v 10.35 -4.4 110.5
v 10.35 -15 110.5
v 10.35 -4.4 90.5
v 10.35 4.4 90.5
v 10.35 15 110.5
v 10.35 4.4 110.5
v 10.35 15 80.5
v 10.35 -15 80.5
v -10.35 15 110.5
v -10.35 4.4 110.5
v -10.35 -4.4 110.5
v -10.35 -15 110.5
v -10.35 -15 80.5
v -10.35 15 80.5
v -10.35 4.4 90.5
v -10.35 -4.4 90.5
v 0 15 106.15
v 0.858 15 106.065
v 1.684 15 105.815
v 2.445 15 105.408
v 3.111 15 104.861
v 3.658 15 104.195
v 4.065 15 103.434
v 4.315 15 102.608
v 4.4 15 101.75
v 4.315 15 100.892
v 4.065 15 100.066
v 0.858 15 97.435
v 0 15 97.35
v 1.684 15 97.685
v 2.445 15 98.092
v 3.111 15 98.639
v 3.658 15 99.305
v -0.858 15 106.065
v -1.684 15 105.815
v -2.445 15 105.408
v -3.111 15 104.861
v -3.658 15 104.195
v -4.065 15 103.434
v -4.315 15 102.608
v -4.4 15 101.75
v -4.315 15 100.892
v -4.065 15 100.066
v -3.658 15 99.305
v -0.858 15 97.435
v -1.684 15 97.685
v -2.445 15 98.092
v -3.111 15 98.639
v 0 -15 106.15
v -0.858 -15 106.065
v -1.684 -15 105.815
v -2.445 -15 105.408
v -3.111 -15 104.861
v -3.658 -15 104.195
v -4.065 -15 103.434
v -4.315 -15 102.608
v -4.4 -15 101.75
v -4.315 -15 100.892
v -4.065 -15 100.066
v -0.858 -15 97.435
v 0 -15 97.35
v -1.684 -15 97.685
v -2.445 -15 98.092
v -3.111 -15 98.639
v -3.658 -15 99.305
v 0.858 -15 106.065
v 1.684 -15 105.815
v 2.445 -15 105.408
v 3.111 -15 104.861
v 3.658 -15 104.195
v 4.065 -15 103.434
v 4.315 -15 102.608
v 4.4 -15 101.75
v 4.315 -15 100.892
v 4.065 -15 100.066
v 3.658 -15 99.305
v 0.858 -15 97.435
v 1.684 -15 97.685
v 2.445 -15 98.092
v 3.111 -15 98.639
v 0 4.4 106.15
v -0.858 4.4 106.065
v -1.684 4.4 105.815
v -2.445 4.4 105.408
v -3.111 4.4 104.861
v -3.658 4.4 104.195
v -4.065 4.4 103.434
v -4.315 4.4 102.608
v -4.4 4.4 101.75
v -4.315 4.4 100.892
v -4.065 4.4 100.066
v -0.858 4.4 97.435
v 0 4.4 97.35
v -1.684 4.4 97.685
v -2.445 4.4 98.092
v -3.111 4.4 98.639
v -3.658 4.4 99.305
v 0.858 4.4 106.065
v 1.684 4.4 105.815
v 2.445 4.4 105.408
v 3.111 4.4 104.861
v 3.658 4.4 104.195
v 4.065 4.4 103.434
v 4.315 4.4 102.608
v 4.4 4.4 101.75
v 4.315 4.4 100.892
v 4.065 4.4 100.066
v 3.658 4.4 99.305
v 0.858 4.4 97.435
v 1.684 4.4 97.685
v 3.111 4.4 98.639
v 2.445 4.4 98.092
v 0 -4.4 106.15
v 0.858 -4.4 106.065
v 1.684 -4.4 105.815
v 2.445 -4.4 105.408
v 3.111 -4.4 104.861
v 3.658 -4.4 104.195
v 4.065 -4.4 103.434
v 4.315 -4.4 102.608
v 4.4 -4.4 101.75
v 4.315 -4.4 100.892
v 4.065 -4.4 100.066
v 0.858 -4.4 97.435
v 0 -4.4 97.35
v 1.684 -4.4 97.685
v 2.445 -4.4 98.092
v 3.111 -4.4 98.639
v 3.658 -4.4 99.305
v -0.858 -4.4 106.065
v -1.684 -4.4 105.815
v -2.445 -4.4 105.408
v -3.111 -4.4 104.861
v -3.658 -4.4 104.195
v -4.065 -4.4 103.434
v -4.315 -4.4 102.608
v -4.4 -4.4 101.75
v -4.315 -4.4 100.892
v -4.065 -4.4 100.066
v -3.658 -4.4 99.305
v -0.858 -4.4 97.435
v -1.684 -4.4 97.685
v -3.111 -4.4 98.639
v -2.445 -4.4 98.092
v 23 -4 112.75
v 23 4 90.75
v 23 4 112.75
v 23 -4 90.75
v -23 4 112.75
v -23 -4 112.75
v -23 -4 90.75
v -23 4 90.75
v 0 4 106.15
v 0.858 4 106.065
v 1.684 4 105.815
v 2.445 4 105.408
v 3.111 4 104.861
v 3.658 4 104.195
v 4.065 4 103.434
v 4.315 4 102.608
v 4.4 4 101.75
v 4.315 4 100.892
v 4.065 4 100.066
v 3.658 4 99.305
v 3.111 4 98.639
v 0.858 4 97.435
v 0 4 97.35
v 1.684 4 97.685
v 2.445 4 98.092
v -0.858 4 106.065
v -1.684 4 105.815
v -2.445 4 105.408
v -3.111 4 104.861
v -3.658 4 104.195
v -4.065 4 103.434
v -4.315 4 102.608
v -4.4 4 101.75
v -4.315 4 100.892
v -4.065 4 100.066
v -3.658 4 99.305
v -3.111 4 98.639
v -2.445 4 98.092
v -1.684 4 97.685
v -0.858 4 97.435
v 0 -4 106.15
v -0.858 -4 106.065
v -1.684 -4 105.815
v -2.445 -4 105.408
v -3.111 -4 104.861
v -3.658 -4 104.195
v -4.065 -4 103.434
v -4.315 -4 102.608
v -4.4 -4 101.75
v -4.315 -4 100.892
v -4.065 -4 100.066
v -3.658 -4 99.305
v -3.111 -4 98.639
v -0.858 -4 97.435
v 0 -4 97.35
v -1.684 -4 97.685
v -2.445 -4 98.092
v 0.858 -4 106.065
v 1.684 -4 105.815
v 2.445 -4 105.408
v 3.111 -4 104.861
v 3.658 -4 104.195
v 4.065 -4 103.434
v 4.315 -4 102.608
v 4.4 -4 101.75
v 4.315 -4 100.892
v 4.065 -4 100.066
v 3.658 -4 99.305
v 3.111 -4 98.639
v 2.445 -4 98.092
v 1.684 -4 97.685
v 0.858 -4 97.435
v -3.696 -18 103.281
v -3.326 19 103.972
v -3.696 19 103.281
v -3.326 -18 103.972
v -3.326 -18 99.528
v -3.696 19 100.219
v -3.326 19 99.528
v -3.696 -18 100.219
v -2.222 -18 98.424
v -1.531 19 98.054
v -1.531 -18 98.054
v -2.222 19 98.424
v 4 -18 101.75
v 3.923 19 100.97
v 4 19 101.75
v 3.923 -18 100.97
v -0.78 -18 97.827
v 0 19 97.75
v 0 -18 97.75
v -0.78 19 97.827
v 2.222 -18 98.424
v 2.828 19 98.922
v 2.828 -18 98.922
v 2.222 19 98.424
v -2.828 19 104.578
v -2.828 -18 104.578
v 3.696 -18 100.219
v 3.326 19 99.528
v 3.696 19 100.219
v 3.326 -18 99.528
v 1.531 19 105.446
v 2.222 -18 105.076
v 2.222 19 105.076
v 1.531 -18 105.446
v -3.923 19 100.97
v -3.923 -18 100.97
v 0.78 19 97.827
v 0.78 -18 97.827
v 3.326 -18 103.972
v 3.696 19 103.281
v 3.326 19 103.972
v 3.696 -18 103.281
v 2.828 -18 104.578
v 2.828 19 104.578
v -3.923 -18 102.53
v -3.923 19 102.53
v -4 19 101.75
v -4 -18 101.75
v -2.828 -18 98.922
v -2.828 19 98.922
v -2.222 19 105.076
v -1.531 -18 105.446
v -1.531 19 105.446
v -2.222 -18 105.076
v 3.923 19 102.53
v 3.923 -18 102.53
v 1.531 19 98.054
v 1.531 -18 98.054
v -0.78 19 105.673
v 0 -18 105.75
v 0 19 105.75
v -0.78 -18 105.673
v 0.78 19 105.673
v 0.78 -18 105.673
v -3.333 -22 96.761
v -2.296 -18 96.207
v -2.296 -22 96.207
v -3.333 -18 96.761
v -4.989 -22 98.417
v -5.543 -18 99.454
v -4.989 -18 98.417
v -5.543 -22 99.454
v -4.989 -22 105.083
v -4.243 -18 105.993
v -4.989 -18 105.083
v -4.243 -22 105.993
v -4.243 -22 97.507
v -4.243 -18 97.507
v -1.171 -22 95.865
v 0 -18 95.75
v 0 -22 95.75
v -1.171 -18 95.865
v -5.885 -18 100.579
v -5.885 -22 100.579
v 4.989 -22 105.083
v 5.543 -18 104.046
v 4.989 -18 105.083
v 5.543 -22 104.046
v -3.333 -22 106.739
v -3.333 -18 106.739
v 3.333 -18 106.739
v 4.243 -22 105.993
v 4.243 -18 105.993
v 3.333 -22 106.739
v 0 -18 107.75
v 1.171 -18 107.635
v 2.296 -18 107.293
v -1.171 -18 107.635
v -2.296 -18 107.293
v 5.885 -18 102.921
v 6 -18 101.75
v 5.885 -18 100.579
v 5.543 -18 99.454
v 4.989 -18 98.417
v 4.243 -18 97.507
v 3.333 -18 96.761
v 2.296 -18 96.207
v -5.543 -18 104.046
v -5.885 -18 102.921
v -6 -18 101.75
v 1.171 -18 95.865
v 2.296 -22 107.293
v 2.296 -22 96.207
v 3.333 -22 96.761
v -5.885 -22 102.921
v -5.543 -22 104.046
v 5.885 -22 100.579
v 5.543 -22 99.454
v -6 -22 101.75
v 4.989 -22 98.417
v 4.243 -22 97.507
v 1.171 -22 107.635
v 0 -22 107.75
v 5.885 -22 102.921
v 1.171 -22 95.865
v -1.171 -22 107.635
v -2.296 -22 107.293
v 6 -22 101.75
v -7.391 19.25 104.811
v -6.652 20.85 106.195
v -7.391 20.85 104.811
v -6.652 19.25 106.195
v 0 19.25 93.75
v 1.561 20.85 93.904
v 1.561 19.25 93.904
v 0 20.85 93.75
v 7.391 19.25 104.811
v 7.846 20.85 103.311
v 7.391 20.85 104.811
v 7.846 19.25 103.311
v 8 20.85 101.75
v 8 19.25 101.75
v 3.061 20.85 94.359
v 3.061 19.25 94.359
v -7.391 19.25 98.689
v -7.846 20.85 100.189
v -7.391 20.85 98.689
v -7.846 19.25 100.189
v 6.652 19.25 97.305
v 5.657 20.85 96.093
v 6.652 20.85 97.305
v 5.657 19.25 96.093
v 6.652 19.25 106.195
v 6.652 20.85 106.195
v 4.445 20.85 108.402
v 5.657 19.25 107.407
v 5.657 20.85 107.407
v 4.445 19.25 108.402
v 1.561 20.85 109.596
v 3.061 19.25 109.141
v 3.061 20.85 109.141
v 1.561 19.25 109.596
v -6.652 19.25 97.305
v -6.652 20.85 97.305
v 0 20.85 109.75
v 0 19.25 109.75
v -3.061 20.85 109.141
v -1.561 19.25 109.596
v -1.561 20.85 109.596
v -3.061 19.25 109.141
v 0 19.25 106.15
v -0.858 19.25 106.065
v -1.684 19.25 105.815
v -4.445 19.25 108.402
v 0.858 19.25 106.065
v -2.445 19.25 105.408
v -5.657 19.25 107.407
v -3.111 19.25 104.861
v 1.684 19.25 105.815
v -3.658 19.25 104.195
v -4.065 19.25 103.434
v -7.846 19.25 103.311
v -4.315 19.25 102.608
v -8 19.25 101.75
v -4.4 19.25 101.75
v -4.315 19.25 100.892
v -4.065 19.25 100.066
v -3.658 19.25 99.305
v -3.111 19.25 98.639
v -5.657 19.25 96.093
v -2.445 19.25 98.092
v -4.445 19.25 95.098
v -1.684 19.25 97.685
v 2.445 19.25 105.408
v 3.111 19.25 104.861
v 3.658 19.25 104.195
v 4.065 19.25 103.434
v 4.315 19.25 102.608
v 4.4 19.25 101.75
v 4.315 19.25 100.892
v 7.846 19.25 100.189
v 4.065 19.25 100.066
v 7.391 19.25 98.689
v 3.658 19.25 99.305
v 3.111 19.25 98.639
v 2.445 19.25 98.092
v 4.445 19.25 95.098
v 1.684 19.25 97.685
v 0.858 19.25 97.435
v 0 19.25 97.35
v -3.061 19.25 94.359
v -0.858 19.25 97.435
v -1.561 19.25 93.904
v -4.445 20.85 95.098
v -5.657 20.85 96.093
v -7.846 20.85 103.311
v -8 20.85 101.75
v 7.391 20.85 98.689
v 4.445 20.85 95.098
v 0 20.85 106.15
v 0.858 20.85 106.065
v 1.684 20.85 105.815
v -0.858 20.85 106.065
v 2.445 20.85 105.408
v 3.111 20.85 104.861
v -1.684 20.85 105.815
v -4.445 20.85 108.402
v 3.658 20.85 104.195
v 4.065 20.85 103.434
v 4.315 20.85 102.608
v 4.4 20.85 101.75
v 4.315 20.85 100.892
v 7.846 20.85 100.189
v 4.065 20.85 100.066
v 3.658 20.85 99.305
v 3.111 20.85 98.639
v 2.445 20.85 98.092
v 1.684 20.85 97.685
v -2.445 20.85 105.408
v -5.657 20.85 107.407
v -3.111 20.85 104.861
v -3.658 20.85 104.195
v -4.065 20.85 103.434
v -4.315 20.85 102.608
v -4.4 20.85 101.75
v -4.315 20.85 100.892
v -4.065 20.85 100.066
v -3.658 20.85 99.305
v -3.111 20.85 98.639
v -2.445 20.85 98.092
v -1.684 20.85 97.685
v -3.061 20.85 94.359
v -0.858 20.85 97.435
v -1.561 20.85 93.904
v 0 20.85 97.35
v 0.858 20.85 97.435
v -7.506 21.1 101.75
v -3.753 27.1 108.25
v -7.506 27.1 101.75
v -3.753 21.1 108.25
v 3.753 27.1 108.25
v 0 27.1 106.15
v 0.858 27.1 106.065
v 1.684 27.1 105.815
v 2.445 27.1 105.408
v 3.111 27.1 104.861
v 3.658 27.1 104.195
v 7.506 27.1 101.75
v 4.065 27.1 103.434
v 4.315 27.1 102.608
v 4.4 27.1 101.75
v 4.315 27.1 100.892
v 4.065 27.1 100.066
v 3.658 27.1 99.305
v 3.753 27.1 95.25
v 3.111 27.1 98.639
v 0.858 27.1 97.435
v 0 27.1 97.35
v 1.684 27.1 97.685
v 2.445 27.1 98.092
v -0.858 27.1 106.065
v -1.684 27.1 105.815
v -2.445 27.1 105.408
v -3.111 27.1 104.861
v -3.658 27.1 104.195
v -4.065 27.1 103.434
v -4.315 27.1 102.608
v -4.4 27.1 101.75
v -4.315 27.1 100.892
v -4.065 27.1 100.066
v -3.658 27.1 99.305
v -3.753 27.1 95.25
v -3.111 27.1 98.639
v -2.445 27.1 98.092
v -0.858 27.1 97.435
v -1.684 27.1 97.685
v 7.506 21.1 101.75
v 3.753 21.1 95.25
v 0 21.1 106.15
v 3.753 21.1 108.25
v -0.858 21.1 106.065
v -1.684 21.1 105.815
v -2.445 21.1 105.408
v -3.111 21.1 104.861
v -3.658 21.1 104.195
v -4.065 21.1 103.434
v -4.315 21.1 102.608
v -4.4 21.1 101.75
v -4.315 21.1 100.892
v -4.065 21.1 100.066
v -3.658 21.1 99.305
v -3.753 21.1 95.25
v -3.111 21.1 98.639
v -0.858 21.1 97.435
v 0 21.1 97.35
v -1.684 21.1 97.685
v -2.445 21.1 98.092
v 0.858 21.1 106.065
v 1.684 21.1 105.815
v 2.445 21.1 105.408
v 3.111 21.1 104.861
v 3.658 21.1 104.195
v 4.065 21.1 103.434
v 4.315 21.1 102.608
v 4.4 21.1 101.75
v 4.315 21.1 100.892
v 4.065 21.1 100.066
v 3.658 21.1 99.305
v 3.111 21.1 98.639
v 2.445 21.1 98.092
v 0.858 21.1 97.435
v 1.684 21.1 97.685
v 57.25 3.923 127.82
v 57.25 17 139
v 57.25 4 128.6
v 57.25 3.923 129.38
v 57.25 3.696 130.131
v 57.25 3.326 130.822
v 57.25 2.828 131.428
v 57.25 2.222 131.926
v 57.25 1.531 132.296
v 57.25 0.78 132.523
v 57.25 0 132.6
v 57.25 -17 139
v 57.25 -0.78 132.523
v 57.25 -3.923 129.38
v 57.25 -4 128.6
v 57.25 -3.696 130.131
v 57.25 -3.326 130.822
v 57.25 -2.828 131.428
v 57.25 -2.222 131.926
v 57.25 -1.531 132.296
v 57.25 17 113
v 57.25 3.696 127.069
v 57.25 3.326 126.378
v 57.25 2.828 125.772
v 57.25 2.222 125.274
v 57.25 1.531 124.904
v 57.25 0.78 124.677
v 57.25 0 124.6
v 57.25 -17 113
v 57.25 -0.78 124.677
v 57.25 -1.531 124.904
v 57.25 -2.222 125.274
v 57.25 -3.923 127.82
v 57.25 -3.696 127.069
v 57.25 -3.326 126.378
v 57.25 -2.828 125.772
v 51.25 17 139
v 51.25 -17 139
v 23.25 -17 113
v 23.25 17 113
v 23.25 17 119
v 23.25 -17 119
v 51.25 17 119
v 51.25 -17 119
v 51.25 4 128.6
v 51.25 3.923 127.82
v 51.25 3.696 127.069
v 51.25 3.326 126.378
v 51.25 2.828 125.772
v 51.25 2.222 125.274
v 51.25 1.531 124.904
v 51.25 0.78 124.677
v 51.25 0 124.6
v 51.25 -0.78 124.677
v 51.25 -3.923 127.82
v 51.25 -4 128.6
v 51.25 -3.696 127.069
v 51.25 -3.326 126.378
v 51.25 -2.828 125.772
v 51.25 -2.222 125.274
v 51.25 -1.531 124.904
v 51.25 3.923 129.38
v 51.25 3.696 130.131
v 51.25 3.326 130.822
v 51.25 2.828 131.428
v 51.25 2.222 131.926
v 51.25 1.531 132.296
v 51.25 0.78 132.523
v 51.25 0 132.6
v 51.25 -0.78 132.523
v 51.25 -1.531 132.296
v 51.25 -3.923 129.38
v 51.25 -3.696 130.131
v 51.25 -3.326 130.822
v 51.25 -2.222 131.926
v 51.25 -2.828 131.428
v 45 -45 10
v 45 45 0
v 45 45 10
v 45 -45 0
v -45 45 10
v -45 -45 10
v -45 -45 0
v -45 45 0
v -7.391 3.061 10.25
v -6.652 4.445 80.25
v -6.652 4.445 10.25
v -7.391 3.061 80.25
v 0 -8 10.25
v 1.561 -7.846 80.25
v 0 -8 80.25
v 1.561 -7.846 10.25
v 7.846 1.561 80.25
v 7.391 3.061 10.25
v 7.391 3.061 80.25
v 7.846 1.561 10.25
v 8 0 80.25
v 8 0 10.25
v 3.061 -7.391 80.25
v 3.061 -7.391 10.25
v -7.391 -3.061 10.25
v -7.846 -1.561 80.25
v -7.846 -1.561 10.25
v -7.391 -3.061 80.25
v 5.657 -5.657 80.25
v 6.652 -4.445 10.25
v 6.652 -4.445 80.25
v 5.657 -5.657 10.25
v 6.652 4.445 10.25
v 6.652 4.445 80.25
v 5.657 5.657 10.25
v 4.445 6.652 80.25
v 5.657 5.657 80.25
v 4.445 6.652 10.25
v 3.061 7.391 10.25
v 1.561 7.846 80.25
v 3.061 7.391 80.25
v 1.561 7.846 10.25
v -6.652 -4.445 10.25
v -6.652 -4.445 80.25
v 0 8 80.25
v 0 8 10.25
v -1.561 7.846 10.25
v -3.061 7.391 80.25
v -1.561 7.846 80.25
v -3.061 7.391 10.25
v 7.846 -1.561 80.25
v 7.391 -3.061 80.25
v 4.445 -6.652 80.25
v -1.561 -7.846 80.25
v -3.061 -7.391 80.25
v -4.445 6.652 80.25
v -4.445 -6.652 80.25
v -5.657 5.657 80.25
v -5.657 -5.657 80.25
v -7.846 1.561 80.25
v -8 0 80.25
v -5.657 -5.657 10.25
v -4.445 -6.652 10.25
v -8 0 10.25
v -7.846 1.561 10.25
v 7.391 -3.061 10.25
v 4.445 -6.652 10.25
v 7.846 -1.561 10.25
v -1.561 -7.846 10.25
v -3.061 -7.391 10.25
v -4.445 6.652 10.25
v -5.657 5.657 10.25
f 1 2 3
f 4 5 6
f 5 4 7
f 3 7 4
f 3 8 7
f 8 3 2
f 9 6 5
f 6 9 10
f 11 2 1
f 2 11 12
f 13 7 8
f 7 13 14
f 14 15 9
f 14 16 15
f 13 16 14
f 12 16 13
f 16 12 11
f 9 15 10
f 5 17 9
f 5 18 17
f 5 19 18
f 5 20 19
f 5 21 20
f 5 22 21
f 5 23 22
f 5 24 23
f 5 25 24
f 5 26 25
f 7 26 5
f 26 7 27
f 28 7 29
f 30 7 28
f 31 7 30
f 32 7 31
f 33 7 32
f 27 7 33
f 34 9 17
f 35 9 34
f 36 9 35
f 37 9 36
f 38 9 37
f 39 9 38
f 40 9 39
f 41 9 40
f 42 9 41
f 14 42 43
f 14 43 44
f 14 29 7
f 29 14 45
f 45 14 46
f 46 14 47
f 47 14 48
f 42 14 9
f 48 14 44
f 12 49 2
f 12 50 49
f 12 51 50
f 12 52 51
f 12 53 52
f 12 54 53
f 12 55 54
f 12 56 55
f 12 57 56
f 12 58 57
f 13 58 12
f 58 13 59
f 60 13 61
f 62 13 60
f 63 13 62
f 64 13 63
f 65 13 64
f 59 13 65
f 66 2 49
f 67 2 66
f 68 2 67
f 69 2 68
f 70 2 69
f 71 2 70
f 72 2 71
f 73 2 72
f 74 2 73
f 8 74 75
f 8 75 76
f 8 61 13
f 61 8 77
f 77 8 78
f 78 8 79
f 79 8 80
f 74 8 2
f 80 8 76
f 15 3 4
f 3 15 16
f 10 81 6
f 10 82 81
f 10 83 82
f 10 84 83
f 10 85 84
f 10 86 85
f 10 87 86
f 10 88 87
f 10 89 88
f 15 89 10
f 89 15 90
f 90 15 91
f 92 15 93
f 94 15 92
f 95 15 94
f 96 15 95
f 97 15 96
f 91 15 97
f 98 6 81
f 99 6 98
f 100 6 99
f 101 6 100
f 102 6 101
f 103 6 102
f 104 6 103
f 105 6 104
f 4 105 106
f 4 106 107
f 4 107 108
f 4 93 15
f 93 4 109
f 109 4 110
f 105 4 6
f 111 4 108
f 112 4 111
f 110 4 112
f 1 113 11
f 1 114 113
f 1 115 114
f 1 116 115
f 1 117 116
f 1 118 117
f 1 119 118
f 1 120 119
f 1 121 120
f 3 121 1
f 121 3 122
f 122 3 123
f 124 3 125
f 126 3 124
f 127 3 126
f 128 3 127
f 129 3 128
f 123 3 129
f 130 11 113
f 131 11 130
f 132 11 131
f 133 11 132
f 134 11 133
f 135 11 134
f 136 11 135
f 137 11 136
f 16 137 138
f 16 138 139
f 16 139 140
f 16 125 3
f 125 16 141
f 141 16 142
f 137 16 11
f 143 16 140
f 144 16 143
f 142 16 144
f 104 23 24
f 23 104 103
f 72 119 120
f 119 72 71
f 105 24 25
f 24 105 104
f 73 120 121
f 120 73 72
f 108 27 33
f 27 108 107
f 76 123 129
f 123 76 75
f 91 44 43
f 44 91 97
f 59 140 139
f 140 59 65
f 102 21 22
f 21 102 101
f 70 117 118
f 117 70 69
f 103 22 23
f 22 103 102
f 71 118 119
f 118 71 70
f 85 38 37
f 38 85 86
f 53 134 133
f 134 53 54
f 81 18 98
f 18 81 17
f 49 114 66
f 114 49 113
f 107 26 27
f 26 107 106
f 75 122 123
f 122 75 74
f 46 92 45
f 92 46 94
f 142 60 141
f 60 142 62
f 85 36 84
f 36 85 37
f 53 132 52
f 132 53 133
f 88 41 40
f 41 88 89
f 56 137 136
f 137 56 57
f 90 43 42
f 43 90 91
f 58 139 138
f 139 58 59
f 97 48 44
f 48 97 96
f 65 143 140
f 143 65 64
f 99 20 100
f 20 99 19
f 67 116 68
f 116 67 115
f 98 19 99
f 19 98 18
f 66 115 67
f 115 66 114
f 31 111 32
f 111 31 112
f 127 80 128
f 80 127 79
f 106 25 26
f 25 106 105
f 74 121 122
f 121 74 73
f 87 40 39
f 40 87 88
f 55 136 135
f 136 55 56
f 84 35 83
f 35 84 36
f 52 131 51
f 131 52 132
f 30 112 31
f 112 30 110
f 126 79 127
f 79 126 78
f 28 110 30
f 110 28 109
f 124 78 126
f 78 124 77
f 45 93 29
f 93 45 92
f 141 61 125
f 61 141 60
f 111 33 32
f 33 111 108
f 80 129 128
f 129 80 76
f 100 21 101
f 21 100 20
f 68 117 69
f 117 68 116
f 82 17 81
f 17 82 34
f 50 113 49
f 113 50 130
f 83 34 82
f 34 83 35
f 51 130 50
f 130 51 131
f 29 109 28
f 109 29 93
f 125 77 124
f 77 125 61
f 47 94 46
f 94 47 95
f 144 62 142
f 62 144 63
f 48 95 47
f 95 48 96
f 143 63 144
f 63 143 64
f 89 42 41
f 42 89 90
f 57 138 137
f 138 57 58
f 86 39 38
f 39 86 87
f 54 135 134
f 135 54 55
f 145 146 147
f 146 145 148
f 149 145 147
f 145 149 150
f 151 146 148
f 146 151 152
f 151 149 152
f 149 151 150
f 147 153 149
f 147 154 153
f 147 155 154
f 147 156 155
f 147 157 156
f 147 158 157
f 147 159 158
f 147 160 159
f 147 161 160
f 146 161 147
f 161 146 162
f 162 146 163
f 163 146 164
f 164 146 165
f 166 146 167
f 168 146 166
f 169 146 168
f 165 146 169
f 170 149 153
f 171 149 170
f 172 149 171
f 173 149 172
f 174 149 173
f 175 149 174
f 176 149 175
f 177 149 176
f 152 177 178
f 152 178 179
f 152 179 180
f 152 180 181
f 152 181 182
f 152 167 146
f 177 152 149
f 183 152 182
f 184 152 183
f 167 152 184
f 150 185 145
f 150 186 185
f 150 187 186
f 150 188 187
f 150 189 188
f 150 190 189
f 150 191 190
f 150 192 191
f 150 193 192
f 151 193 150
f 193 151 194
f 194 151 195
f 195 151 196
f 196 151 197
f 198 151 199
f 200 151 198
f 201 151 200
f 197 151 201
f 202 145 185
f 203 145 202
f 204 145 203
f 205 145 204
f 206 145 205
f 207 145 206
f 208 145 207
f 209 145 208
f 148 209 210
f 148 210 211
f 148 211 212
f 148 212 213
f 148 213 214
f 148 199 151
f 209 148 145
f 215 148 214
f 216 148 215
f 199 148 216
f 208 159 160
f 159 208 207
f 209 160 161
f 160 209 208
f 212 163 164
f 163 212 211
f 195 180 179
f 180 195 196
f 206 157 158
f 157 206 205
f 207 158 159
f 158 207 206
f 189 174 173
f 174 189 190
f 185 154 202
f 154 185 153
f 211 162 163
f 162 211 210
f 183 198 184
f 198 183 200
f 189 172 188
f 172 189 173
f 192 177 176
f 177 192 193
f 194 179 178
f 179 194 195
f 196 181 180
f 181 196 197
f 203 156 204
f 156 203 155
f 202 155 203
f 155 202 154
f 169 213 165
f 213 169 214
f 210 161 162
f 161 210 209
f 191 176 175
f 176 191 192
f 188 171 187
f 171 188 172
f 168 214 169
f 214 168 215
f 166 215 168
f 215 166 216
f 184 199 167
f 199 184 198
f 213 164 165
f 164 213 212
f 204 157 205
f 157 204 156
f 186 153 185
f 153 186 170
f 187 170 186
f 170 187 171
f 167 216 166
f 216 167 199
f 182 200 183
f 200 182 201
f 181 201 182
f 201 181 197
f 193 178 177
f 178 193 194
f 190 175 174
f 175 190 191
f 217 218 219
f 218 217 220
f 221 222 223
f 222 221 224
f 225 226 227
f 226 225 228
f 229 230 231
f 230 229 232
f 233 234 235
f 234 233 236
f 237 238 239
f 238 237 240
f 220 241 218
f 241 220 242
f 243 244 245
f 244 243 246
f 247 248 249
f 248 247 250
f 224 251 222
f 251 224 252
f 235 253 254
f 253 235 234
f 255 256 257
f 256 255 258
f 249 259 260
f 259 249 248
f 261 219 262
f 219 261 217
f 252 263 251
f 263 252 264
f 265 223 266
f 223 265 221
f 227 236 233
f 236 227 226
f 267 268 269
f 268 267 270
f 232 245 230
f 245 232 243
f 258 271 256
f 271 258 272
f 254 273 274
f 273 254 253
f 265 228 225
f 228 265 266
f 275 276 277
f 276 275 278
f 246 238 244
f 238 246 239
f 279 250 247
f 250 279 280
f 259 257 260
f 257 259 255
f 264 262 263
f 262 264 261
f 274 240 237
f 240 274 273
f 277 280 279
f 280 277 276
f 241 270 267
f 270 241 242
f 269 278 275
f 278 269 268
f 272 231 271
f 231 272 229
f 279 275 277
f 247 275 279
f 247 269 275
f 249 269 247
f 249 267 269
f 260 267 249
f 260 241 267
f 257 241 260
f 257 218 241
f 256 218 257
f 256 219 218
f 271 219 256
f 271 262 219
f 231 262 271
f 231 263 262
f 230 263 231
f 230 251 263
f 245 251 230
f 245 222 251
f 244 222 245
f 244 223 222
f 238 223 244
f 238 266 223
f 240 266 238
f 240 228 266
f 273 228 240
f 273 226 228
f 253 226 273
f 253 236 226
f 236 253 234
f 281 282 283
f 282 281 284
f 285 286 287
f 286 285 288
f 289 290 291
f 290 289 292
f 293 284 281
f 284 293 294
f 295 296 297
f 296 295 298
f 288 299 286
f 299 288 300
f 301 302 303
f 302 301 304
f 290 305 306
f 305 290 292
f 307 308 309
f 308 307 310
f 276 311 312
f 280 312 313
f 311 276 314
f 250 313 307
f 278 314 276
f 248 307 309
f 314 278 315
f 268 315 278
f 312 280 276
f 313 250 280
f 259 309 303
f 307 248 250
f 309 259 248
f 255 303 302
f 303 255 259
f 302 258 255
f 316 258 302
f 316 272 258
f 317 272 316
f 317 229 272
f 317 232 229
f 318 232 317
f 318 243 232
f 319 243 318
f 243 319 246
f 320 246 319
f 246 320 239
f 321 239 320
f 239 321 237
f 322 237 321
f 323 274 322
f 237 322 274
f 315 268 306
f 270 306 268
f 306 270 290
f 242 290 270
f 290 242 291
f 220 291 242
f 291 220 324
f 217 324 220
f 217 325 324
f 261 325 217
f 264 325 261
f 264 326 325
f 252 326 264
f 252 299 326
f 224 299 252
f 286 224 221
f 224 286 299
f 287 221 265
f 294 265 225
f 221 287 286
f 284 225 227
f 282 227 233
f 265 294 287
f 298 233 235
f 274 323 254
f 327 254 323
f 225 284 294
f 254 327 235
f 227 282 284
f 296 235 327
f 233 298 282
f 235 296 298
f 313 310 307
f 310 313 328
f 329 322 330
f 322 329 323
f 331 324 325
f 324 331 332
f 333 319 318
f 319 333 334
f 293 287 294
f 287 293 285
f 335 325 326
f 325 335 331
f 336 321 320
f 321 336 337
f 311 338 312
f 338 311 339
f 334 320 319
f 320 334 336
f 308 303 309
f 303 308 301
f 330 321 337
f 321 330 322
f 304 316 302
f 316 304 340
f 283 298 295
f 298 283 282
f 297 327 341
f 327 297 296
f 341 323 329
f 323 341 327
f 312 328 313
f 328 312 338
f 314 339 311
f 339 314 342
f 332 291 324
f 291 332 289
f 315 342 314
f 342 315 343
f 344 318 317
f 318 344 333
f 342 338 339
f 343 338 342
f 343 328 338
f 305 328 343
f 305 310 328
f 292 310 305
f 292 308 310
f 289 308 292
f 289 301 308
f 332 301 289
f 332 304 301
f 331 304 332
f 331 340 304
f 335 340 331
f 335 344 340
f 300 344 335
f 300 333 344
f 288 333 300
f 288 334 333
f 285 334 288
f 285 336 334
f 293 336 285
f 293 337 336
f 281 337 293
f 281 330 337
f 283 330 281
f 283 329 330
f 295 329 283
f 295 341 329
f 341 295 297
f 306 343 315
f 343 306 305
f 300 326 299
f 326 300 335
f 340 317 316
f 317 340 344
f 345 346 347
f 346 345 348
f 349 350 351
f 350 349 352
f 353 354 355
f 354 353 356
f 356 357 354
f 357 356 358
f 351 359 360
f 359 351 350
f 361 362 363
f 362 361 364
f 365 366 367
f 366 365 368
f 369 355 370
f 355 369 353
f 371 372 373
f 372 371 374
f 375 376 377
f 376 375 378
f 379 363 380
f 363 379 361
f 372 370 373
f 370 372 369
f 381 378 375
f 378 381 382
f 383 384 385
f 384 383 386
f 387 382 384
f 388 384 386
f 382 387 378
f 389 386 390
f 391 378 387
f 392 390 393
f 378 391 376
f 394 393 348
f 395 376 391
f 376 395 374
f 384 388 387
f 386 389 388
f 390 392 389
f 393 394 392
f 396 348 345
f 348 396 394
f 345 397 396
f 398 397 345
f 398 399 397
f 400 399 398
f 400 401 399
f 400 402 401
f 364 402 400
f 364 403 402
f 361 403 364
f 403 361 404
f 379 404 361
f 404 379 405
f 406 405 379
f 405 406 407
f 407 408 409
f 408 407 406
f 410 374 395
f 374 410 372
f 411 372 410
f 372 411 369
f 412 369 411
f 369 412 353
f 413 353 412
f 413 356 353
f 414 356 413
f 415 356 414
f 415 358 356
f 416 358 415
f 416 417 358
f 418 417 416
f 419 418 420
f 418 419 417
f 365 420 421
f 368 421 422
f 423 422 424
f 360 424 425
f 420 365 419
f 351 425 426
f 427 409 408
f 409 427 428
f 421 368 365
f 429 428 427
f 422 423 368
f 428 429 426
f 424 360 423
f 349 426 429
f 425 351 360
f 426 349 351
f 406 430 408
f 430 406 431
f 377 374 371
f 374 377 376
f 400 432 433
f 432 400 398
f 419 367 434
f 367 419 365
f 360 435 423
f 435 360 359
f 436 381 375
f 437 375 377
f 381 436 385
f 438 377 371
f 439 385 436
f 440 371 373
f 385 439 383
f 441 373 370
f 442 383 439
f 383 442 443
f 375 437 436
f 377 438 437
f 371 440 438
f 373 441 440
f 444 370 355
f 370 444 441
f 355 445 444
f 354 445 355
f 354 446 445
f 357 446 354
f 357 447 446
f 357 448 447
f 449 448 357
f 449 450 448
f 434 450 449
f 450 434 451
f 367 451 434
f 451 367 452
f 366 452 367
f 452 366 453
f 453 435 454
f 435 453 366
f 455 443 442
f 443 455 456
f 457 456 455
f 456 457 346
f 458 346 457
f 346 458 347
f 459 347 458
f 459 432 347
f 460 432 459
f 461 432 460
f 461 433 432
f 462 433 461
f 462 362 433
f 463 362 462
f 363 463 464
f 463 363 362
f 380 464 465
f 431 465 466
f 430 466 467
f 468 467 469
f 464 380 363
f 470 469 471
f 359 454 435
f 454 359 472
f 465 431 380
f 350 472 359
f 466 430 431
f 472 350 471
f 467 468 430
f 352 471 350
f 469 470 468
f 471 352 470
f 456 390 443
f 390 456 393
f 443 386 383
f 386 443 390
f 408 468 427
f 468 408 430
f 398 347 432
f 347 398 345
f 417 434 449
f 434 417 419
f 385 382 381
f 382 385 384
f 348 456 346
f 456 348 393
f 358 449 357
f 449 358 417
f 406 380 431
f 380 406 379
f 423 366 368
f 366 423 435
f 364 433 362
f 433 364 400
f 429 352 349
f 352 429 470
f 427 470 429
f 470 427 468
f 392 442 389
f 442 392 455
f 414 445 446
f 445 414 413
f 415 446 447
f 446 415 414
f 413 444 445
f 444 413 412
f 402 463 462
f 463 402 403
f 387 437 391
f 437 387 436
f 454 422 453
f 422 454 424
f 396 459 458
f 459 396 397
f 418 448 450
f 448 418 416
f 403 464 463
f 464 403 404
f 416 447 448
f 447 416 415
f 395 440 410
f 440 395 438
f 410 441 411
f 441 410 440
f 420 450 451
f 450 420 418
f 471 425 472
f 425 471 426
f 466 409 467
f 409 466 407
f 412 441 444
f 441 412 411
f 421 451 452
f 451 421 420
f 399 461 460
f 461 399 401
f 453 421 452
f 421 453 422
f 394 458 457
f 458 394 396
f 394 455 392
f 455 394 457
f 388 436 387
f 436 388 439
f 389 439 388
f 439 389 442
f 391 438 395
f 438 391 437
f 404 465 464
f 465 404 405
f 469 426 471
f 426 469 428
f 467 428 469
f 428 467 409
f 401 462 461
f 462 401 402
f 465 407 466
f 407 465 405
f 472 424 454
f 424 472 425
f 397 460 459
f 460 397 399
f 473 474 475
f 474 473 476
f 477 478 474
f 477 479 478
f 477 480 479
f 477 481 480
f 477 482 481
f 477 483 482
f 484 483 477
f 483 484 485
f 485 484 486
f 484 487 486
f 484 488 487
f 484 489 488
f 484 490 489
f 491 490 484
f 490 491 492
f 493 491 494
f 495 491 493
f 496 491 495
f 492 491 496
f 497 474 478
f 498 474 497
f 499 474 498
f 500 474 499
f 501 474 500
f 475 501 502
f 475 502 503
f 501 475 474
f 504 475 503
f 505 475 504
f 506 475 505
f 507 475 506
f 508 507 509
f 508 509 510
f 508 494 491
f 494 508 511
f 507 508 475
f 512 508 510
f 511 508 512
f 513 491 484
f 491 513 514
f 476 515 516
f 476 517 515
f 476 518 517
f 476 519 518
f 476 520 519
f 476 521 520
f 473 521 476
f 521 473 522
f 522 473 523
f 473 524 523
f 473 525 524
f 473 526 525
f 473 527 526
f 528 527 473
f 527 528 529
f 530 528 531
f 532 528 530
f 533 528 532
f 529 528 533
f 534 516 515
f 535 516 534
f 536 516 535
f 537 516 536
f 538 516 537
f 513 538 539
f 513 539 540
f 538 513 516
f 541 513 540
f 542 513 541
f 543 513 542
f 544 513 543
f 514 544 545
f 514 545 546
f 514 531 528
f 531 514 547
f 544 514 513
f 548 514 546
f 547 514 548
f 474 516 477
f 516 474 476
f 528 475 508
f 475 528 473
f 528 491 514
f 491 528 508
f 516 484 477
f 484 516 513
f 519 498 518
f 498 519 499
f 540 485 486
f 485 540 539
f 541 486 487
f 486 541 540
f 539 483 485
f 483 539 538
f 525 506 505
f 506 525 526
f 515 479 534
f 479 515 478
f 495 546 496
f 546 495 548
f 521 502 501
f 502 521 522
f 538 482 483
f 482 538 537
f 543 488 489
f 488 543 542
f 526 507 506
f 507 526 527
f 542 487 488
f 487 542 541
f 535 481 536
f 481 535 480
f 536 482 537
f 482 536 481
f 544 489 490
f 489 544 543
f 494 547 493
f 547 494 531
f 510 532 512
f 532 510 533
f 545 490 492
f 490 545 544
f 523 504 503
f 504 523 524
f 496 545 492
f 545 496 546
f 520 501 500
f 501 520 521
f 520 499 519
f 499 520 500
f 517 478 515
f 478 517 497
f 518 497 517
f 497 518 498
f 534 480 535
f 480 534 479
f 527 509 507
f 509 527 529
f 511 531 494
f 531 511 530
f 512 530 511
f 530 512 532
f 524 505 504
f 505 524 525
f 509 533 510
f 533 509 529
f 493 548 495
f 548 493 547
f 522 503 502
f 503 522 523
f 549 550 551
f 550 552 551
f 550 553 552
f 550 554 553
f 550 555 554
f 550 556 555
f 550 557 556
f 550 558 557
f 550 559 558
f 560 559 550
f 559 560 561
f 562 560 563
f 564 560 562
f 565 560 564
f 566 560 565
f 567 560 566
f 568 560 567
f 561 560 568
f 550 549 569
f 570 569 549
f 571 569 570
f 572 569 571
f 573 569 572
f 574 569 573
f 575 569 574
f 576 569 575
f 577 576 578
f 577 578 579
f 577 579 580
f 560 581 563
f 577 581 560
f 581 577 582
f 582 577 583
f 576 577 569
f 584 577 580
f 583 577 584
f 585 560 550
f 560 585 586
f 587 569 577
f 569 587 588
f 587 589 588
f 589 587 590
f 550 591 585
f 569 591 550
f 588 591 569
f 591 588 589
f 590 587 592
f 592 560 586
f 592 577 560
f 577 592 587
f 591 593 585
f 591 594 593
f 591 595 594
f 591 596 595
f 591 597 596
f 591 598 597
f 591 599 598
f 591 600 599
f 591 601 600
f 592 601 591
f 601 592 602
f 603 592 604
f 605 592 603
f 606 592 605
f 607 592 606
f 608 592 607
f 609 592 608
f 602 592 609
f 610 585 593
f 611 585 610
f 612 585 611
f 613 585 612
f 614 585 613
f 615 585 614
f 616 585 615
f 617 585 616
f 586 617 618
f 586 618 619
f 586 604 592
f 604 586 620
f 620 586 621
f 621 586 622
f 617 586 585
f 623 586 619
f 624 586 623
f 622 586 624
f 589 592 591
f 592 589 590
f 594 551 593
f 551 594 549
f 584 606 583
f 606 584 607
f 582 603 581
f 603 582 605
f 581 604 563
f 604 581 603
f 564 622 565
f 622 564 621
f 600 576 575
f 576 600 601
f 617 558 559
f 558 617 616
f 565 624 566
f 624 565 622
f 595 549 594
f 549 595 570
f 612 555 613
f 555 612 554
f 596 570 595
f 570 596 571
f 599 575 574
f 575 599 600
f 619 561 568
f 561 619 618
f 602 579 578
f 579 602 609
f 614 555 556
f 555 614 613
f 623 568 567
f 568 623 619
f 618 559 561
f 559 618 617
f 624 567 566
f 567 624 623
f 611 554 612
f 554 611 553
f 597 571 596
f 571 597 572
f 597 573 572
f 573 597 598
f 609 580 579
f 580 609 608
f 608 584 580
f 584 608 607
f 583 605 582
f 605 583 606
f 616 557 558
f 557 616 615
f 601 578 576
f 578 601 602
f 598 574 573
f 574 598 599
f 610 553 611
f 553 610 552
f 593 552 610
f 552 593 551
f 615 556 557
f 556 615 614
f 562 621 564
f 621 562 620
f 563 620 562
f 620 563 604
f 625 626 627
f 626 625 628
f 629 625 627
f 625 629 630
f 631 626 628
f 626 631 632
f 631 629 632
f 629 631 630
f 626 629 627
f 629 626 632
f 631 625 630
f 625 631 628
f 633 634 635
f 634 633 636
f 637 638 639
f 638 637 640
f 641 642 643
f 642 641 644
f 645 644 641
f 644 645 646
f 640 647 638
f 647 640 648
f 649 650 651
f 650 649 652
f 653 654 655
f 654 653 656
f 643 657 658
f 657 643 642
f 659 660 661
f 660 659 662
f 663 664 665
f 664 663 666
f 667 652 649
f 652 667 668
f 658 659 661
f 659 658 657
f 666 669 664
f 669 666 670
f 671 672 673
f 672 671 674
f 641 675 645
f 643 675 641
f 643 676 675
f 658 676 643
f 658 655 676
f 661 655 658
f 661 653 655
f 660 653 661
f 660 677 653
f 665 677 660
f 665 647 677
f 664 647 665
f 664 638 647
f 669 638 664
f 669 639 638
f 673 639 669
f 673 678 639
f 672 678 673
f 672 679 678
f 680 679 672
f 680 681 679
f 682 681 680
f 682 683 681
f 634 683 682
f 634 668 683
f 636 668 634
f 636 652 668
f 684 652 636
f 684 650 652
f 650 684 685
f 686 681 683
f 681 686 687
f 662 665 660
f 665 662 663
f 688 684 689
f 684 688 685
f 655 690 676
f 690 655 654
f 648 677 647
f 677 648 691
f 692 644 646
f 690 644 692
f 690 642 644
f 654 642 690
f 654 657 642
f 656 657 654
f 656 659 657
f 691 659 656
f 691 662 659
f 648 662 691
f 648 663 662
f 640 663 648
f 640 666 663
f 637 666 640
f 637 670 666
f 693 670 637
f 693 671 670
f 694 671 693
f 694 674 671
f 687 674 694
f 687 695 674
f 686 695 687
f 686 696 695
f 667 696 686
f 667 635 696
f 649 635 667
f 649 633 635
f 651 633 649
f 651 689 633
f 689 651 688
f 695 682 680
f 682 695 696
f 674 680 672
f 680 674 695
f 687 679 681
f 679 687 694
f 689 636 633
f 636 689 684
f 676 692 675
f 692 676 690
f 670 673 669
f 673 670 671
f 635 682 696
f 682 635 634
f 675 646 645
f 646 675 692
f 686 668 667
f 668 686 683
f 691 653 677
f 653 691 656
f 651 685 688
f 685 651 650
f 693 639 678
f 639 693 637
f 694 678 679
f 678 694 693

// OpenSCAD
$fn = 32;

// ------------------------------------------------------------------------
// Lamp arm: column d16 x 70 mm, arm 46 mm
// Every part is its own module, assembly() places every instance.
// ------------------------------------------------------------------------

// --- part 1 ---
module lamp_base() {
  difference() {
    translate([-45, -45, 0]) cube([90, 90, 10]);
  }
}

// --- part 2 ---
module lamp_column() {
  cylinder(h = 70, d = 16);
}

// --- part 3 ---
module head_fork() {
  difference() {
    translate([-10.35, -15, 0]) cube([20.7, 30, 30]);
    translate([-11.35, -4.4, 10]) cube([22.7, 8.8, 21]);
    translate([0, 0, 21.25]) rotate([90, 0, 0]) cylinder(h = 32, d = 8.8, center = true);
  }
}

// --- part 4 ---
module lamp_arm() {
  difference() {
    translate([-23, -4, 0]) cube([46, 8, 22]);
    translate([0, 0, 11]) rotate([90, 0, 0]) cylinder(h = 10, d = 8.8, center = true);
  }
}

// --- part 5 ---
module arm_pin() {
  rotate([0, 90, 0]) cylinder(h = 38, d = 8, center = true);
  translate([-22, 0, 0]) rotate([0, 90, 0]) cylinder(h = 4, d = 12);
}

// --- part 6 ---
module arm_washer() {
  difference() {
      translate([0, 0, 0]) cylinder(h = 1.6, d = 16);
      translate([0, 0, -1]) cylinder(h = 3.6, d = 8.8);
    }
}

// --- part 7 ---
module arm_nut() {
  difference() {
    linear_extrude(height = 6) polygon(points = [[7.506, 0], [3.753, 6.5], [-3.753, 6.5], [-7.506, 0], [-3.753, -6.5], [3.753, -6.5]]);
    translate([0, 0, -1]) cylinder(h = 8, d = 8.8);
  }
}

// --- part 8 ---
module shade_bracket() {
  difference() {
    translate([-17, -17, 0]) cube([34, 34, 26]);
    translate([-18, -18, 6]) cube([29, 36, 21]);
    translate([14, 0, 15.6]) rotate([0, 90, 0]) cylinder(h = 8, d = 8, center = true);
  }
}

// --- assembly ---
module assembly() {
  color([0.80, 0.24, 0.20]) translate([0, 0, 0]) rotate([0, 0, 0]) lamp_base();
  color([0.20, 0.45, 0.75]) translate([0, 0, 10.25]) rotate([0, 0, 0]) lamp_column();
  color([0.25, 0.62, 0.32]) translate([0, 0, 80.5]) rotate([0, 0, 0]) head_fork();
  color([0.92, 0.70, 0.18]) translate([0, 0, 90.75]) rotate([0, 0, 0]) lamp_arm();
  color([0.58, 0.35, 0.70]) translate([0, 0, 101.75]) rotate([0, 0, 90]) arm_pin();
  color([0.16, 0.66, 0.66]) translate([0, 20.85, 101.75]) rotate([90, 0, 0]) arm_washer();
  color([0.85, 0.48, 0.18]) translate([0, 27.1, 101.75]) rotate([90, 0, 0]) arm_nut();
  color([0.55, 0.60, 0.65]) translate([40.25, 0, 113]) rotate([0, 0, 0]) shade_bracket();
}

assembly();
